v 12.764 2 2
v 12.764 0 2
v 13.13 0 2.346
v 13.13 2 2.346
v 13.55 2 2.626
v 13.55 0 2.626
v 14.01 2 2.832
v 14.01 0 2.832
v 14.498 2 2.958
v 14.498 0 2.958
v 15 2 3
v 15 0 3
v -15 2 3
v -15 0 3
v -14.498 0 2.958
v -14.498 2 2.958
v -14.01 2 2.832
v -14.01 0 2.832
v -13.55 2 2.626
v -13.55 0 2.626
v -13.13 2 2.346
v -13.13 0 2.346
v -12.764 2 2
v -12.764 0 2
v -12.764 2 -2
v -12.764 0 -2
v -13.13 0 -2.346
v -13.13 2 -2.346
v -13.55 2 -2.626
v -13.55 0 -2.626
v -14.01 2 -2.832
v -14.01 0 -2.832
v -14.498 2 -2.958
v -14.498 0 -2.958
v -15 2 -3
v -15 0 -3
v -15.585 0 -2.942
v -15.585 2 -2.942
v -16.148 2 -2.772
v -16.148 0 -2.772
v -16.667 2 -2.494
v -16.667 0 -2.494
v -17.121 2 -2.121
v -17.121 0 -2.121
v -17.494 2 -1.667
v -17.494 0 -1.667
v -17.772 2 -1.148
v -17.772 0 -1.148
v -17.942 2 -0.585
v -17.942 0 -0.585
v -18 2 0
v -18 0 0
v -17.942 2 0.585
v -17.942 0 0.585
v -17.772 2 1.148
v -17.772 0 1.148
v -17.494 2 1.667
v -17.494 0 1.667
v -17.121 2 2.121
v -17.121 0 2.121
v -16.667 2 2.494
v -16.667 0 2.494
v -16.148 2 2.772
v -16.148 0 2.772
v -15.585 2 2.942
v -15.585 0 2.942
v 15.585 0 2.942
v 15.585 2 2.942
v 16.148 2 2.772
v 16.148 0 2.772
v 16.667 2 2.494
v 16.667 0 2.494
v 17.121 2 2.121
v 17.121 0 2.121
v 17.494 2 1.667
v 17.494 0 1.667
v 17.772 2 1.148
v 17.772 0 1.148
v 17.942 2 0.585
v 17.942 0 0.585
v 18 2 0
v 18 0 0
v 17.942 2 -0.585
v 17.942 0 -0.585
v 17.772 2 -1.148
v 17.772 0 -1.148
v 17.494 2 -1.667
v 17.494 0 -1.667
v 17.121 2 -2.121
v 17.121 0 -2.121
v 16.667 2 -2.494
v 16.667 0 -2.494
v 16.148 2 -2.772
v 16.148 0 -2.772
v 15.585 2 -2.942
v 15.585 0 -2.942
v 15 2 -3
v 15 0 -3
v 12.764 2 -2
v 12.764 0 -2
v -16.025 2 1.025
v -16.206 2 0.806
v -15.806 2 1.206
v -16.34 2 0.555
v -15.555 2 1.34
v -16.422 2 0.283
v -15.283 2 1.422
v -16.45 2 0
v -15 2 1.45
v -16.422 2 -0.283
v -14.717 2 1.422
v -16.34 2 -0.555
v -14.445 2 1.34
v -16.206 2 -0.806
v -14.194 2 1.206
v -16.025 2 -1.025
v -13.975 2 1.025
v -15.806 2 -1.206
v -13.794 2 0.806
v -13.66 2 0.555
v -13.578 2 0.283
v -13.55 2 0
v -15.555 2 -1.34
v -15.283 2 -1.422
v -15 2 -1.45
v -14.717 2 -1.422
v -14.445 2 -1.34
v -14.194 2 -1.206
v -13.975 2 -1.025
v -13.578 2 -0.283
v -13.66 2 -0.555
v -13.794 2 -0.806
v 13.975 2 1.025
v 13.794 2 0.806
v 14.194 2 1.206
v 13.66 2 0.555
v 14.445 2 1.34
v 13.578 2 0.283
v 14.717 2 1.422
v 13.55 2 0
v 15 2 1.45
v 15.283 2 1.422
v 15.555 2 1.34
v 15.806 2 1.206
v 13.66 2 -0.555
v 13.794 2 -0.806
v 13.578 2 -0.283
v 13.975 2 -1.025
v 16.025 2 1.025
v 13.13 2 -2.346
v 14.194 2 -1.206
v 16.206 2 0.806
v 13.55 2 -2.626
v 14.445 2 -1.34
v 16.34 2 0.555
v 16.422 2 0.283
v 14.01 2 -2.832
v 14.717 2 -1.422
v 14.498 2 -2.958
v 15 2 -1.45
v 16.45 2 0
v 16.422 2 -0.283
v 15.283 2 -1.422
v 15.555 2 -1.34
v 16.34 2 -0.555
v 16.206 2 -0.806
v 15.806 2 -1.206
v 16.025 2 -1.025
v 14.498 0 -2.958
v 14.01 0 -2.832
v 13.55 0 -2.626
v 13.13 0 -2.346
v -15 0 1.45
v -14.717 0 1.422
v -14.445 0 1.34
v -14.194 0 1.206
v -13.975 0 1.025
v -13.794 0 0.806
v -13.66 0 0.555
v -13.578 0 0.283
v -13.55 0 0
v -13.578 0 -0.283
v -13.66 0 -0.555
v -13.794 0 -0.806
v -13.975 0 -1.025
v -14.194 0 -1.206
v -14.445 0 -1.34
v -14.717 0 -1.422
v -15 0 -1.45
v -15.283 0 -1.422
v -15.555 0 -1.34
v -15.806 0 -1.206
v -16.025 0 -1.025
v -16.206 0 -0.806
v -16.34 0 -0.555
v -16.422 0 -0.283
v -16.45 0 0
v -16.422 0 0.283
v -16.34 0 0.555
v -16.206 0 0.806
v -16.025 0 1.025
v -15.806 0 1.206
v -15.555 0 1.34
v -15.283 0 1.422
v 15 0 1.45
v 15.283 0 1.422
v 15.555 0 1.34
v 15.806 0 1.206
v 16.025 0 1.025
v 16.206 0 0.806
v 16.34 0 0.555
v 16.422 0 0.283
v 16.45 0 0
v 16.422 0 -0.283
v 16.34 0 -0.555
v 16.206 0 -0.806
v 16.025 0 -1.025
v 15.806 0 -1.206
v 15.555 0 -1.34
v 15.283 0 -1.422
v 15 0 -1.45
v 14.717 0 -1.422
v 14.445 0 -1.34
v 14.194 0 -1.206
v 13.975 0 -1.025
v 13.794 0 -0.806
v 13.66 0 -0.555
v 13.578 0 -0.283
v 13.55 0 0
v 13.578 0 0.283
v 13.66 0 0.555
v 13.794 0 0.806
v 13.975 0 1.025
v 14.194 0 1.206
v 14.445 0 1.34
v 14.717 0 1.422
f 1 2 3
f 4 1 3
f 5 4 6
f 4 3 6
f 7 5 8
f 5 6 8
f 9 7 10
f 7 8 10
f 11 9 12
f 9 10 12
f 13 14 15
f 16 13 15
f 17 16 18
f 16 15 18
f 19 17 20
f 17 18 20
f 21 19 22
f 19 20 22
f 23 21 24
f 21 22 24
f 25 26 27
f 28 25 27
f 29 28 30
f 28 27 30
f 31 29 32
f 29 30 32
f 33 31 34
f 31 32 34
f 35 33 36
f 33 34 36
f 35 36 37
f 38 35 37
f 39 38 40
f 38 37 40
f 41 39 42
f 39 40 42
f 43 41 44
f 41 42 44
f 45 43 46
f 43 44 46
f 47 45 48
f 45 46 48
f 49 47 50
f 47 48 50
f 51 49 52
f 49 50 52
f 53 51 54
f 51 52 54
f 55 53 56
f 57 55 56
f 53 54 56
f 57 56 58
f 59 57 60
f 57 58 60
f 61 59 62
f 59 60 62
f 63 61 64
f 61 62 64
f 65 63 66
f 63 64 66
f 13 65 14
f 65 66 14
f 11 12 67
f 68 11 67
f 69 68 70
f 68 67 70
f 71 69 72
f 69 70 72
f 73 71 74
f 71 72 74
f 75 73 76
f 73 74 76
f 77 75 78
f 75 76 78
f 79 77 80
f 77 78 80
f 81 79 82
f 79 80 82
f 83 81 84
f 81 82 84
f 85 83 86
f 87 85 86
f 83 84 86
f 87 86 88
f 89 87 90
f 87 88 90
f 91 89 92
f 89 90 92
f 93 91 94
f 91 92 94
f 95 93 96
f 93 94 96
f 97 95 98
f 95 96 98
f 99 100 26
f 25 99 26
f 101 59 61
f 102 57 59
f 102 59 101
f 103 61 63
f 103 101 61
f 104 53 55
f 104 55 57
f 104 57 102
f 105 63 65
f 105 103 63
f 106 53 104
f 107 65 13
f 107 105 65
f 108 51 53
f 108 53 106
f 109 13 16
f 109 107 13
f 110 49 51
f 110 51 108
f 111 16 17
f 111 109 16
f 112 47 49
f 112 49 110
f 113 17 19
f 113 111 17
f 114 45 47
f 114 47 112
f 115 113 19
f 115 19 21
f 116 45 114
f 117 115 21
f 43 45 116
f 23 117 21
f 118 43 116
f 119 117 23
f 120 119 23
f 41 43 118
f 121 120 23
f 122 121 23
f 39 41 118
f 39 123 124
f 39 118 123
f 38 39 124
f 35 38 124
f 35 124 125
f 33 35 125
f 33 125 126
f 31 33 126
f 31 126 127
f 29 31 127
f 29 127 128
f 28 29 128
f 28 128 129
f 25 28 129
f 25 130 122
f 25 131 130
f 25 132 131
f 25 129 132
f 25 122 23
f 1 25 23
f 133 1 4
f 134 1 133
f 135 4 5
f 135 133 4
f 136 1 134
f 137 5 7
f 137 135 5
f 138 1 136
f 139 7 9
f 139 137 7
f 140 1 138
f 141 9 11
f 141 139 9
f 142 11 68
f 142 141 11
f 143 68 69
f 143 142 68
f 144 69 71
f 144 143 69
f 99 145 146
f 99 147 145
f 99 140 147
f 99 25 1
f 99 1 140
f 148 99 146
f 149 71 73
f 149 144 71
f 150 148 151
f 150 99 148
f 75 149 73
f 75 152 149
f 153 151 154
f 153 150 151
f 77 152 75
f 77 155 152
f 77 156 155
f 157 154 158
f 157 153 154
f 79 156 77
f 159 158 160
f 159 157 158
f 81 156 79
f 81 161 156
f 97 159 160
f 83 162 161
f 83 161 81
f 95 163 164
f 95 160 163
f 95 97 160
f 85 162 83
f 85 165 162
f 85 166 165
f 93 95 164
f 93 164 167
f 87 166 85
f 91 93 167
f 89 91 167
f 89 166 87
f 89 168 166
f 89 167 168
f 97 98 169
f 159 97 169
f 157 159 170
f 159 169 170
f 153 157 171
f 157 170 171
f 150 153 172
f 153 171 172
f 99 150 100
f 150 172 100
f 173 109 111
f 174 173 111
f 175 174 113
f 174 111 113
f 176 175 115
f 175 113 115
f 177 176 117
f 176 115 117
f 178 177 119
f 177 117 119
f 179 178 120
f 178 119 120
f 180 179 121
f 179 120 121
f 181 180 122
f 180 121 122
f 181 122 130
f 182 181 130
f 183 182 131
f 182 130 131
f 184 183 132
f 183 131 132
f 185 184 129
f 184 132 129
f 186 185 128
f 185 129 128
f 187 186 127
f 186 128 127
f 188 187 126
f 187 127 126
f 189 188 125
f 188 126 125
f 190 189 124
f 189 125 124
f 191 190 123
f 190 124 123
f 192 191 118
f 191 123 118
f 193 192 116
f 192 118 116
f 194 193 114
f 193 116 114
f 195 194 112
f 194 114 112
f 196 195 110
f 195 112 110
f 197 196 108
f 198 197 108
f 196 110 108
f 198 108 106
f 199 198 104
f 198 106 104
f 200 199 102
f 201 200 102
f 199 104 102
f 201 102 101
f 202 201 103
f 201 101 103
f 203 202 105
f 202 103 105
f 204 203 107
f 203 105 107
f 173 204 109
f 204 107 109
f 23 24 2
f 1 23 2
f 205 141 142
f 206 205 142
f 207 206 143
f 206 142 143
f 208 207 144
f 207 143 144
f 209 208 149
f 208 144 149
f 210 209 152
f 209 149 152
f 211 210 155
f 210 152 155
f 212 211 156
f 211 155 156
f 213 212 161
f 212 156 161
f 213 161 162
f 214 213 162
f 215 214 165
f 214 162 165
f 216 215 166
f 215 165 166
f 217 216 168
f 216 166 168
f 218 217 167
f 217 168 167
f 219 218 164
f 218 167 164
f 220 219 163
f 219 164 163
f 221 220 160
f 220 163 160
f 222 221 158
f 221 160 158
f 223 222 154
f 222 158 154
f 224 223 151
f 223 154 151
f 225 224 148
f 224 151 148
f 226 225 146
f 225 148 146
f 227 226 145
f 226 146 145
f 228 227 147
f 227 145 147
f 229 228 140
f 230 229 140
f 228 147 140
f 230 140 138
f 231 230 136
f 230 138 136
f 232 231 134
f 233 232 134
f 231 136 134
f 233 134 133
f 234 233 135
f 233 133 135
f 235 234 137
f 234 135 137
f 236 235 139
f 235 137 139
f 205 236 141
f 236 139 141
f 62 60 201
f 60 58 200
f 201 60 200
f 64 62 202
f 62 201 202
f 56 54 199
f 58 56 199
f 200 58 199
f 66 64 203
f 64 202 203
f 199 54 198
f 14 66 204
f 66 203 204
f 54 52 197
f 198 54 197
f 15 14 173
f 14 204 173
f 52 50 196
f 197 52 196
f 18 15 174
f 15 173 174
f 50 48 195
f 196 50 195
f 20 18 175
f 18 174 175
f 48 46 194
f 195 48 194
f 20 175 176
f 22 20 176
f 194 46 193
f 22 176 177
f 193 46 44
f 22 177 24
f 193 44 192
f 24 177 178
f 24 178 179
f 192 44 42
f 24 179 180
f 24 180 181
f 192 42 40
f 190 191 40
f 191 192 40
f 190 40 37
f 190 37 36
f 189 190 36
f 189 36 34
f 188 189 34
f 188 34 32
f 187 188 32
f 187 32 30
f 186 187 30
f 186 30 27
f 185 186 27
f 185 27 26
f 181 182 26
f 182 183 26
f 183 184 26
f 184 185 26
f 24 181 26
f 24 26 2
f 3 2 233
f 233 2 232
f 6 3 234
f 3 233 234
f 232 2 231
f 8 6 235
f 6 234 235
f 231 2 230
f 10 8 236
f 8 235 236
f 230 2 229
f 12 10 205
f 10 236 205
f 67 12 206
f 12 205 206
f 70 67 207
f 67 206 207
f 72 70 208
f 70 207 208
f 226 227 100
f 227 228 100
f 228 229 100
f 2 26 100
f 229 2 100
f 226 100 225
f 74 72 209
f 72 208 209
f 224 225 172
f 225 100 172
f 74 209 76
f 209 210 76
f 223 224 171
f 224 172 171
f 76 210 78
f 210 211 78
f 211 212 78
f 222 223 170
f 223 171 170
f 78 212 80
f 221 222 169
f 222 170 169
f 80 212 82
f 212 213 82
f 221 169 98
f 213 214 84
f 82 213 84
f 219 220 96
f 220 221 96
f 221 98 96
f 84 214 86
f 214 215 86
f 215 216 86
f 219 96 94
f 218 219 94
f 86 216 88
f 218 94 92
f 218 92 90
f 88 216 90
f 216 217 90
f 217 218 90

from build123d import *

# Parameters (mm, degrees)
SALIENTE_EXTRUIR1_DEPTH = 2
CROQUIS_BARRENOS_R      = 1.45
CORTAR_EXTRUIR1_DEPTH   = 2


with BuildPart() as part:
    # Croquis base → Saliente-Extruir1 (new body)
    with BuildSketch(Plane(origin=(0, 0, 0), x_dir=(1, 0, 0), z_dir=(0, 1, 0))):
        with BuildLine():
            Line((12.763932023, 2), (-12.763932023, 2))
            ThreePointArc((-12.763932023, 2), (-13.775255129, 2.738612788), (-15, 3))
            ThreePointArc((-15, 3), (-18, 0), (-15, -3))
            ThreePointArc((-15, -3), (-13.775255129, -2.738612788), (-12.763932023, -2))
            Line((-12.763932023, -2), (12.763932023, -2))
            ThreePointArc((12.763932023, -2), (13.775255129, -2.738612788), (15, -3))
            ThreePointArc((15, -3), (18, 0), (15, 3))
            ThreePointArc((15, 3), (13.775255129, 2.738612788), (12.763932023, 2))
        make_face()
    extrude(amount=SALIENTE_EXTRUIR1_DEPTH)

    # Croquis barrenos → Cortar-Extruir1 (cut)
    with BuildSketch(Plane(origin=(0, 2, 0), x_dir=(1, 0, 0), z_dir=(0, 1, 0))):
        with Locations(Location((-15, 0, 0), (0, 0, 270))):
            Circle(CROQUIS_BARRENOS_R)
        with Locations(Location((15, 0, 0), (0, 0, 270))):
            Circle(CROQUIS_BARRENOS_R)
    extrude(amount=-CORTAR_EXTRUIR1_DEPTH, mode=Mode.SUBTRACT)


solid = part.part
